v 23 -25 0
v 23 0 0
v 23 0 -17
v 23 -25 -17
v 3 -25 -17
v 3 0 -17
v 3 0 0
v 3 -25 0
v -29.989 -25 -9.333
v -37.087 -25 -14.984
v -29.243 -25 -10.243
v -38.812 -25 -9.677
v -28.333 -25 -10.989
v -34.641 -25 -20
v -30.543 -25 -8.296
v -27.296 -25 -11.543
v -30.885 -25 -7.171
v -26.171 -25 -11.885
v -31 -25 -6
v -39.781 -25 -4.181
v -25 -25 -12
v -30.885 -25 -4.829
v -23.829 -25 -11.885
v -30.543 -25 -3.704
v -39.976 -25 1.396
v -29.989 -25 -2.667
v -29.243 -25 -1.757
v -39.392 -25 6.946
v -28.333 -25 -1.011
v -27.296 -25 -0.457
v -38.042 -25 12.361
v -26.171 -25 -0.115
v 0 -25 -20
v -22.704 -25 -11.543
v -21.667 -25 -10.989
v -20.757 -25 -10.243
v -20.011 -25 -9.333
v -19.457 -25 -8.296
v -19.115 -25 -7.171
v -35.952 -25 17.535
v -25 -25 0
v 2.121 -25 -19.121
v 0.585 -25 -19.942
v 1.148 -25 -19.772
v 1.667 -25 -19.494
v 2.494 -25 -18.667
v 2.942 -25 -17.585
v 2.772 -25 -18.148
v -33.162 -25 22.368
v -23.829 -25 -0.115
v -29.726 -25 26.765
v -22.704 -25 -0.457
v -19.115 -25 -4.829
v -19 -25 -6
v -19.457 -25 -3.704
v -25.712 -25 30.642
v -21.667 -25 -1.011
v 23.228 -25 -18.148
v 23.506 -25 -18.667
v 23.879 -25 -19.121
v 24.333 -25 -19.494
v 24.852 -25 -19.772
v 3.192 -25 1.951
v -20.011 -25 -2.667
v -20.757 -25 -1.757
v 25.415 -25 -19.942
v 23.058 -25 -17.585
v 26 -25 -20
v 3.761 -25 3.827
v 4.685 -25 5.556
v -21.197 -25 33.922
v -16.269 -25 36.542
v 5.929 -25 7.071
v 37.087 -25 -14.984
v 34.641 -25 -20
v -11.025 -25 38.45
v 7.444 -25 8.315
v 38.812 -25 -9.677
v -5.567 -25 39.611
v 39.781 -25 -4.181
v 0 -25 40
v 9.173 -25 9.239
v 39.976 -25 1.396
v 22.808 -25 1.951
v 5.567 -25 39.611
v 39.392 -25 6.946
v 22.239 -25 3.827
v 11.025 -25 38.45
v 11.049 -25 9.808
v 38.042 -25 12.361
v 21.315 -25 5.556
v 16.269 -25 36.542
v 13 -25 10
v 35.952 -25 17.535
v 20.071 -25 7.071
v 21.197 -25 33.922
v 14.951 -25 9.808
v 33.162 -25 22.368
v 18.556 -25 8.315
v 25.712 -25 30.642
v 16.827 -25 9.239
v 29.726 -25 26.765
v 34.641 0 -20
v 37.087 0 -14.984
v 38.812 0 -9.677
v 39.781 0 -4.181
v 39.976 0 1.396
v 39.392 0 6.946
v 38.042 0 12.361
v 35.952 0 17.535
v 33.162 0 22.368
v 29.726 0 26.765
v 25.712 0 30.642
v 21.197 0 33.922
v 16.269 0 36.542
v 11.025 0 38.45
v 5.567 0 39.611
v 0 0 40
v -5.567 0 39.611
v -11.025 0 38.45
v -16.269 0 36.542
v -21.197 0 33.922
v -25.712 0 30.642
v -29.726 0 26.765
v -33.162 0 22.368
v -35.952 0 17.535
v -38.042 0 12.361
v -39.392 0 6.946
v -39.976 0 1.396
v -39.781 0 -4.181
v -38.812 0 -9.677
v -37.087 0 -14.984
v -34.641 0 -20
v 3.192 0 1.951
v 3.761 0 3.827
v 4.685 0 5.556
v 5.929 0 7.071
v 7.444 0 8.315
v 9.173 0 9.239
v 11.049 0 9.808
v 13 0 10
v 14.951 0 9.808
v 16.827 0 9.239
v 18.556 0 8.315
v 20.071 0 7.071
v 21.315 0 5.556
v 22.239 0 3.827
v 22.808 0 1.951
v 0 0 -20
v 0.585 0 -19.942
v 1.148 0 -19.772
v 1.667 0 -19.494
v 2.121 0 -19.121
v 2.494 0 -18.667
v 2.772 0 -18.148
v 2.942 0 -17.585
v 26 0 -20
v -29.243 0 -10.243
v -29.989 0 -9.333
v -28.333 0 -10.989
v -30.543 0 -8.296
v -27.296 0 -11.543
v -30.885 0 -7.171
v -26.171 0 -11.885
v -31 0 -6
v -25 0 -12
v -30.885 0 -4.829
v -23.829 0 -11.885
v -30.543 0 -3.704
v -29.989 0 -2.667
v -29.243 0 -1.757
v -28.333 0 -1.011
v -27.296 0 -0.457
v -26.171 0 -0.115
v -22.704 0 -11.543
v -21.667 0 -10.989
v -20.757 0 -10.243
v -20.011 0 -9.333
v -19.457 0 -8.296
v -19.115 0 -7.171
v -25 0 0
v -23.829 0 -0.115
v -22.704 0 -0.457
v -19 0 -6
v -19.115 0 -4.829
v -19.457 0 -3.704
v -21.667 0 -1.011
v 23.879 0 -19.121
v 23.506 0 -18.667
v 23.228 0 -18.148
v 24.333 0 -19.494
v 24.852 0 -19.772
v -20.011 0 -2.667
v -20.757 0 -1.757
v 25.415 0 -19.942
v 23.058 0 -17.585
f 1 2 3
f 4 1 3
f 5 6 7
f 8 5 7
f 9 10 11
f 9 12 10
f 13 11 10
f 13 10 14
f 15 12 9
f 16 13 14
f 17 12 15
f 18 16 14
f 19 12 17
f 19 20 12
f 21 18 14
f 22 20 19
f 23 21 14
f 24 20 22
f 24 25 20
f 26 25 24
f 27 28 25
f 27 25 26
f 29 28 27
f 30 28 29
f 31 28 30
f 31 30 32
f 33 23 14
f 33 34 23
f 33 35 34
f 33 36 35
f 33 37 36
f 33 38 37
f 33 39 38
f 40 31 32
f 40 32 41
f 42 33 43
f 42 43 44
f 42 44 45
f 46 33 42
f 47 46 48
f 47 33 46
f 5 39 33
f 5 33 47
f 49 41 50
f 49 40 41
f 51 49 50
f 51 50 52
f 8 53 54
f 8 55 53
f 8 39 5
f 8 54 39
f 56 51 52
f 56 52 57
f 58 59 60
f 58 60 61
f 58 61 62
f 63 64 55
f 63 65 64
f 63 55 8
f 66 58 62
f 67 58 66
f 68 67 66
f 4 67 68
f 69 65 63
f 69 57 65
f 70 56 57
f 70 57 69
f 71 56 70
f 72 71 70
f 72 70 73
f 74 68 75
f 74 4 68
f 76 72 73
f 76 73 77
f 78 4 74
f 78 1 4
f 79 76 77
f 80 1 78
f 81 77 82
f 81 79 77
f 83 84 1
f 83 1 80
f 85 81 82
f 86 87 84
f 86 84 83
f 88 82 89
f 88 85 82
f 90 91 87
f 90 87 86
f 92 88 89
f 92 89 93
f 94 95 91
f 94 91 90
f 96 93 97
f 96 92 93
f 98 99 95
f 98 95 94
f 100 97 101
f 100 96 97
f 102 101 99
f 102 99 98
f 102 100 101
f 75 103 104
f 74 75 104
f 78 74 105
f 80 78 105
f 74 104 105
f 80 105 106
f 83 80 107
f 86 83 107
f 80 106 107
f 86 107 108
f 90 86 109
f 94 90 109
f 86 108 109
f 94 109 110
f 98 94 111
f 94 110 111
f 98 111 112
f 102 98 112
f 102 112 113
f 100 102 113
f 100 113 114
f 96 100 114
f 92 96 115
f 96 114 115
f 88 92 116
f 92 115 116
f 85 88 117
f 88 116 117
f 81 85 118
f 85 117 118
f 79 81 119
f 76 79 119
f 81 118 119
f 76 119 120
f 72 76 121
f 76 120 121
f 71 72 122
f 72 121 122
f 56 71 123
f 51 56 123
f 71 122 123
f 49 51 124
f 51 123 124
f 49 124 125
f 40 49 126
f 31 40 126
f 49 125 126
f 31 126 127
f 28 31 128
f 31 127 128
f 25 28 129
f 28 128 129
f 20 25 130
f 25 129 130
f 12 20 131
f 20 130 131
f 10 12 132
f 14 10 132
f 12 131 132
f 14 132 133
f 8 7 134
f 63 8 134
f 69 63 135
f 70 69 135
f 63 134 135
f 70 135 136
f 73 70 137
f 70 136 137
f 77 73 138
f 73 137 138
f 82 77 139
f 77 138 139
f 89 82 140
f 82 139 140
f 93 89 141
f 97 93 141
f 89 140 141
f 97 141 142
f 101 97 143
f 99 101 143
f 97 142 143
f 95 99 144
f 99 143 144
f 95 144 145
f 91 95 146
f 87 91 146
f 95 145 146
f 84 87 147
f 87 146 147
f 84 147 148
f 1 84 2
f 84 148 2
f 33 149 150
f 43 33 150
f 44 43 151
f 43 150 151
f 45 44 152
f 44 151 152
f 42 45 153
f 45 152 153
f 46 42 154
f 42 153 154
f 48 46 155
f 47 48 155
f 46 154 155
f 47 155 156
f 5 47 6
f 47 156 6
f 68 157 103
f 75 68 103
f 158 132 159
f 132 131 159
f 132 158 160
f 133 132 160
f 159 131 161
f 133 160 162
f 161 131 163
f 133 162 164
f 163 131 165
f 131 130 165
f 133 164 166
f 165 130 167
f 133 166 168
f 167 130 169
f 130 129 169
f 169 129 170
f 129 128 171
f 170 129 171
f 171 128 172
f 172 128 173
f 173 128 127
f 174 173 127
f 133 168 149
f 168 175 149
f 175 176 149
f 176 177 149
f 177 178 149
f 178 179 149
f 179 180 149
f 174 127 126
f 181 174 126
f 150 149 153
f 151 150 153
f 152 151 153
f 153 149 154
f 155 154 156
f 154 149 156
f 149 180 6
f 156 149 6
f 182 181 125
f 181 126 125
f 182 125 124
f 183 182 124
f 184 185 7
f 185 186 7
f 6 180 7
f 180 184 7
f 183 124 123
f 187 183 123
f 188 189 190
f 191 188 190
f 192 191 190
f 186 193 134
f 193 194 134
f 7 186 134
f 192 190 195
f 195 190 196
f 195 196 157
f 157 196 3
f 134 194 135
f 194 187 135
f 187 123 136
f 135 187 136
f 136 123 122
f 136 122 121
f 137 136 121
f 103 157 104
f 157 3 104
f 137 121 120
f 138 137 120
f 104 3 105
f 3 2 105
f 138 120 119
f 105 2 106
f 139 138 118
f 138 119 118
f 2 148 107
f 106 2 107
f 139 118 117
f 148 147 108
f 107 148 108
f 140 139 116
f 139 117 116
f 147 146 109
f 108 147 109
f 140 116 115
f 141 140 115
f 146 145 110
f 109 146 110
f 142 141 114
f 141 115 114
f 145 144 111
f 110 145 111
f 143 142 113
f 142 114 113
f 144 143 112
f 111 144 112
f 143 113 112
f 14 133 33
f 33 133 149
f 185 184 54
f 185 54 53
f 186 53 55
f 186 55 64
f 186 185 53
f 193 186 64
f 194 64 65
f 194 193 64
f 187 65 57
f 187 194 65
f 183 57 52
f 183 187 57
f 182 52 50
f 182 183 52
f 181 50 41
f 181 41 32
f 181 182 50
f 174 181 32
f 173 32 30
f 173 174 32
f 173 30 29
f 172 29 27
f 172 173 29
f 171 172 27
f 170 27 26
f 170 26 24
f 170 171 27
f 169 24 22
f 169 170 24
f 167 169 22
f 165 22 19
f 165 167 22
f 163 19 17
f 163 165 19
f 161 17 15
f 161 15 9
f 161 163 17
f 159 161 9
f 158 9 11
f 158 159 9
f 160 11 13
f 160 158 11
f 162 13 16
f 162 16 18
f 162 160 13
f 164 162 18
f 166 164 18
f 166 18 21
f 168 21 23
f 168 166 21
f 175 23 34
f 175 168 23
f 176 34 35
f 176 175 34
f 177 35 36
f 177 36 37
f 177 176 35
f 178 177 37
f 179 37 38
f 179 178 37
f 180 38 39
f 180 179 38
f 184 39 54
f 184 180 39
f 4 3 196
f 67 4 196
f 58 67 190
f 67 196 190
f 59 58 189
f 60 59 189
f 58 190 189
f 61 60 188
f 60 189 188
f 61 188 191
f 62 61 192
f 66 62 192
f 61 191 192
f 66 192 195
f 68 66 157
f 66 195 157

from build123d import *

# Parameters (mm, degrees)
F0_R     = 6
F1_DEPTH = 25


with BuildPart() as f1:
    # F0 (on Front) → F1 (new body)
    with BuildSketch(Plane.XZ):
        with BuildLine():
            Line((26, -20), (34.641016, -20))
            ThreePointArc((34.641016, -20), (0, 40), (-34.641016, -20))
            Line((-34.641016, -20), (-23.449086, -20))
            Line((-23.449086, -20), (0, -20))
            ThreePointArc((0, -20), (2.12132, -19.12132), (3, -17))
            Line((3, -17), (3, 0))
            ThreePointArc((3, 0), (13, 10), (23, 0))
            Line((23, 0), (23, -17))
            ThreePointArc((23, -17), (23.87868, -19.12132), (26, -20))
        make_face()
        with Locations((-25, -6)):
            Circle(F0_R, mode=Mode.SUBTRACT)
    extrude(amount=F1_DEPTH)


solid = f1.part
